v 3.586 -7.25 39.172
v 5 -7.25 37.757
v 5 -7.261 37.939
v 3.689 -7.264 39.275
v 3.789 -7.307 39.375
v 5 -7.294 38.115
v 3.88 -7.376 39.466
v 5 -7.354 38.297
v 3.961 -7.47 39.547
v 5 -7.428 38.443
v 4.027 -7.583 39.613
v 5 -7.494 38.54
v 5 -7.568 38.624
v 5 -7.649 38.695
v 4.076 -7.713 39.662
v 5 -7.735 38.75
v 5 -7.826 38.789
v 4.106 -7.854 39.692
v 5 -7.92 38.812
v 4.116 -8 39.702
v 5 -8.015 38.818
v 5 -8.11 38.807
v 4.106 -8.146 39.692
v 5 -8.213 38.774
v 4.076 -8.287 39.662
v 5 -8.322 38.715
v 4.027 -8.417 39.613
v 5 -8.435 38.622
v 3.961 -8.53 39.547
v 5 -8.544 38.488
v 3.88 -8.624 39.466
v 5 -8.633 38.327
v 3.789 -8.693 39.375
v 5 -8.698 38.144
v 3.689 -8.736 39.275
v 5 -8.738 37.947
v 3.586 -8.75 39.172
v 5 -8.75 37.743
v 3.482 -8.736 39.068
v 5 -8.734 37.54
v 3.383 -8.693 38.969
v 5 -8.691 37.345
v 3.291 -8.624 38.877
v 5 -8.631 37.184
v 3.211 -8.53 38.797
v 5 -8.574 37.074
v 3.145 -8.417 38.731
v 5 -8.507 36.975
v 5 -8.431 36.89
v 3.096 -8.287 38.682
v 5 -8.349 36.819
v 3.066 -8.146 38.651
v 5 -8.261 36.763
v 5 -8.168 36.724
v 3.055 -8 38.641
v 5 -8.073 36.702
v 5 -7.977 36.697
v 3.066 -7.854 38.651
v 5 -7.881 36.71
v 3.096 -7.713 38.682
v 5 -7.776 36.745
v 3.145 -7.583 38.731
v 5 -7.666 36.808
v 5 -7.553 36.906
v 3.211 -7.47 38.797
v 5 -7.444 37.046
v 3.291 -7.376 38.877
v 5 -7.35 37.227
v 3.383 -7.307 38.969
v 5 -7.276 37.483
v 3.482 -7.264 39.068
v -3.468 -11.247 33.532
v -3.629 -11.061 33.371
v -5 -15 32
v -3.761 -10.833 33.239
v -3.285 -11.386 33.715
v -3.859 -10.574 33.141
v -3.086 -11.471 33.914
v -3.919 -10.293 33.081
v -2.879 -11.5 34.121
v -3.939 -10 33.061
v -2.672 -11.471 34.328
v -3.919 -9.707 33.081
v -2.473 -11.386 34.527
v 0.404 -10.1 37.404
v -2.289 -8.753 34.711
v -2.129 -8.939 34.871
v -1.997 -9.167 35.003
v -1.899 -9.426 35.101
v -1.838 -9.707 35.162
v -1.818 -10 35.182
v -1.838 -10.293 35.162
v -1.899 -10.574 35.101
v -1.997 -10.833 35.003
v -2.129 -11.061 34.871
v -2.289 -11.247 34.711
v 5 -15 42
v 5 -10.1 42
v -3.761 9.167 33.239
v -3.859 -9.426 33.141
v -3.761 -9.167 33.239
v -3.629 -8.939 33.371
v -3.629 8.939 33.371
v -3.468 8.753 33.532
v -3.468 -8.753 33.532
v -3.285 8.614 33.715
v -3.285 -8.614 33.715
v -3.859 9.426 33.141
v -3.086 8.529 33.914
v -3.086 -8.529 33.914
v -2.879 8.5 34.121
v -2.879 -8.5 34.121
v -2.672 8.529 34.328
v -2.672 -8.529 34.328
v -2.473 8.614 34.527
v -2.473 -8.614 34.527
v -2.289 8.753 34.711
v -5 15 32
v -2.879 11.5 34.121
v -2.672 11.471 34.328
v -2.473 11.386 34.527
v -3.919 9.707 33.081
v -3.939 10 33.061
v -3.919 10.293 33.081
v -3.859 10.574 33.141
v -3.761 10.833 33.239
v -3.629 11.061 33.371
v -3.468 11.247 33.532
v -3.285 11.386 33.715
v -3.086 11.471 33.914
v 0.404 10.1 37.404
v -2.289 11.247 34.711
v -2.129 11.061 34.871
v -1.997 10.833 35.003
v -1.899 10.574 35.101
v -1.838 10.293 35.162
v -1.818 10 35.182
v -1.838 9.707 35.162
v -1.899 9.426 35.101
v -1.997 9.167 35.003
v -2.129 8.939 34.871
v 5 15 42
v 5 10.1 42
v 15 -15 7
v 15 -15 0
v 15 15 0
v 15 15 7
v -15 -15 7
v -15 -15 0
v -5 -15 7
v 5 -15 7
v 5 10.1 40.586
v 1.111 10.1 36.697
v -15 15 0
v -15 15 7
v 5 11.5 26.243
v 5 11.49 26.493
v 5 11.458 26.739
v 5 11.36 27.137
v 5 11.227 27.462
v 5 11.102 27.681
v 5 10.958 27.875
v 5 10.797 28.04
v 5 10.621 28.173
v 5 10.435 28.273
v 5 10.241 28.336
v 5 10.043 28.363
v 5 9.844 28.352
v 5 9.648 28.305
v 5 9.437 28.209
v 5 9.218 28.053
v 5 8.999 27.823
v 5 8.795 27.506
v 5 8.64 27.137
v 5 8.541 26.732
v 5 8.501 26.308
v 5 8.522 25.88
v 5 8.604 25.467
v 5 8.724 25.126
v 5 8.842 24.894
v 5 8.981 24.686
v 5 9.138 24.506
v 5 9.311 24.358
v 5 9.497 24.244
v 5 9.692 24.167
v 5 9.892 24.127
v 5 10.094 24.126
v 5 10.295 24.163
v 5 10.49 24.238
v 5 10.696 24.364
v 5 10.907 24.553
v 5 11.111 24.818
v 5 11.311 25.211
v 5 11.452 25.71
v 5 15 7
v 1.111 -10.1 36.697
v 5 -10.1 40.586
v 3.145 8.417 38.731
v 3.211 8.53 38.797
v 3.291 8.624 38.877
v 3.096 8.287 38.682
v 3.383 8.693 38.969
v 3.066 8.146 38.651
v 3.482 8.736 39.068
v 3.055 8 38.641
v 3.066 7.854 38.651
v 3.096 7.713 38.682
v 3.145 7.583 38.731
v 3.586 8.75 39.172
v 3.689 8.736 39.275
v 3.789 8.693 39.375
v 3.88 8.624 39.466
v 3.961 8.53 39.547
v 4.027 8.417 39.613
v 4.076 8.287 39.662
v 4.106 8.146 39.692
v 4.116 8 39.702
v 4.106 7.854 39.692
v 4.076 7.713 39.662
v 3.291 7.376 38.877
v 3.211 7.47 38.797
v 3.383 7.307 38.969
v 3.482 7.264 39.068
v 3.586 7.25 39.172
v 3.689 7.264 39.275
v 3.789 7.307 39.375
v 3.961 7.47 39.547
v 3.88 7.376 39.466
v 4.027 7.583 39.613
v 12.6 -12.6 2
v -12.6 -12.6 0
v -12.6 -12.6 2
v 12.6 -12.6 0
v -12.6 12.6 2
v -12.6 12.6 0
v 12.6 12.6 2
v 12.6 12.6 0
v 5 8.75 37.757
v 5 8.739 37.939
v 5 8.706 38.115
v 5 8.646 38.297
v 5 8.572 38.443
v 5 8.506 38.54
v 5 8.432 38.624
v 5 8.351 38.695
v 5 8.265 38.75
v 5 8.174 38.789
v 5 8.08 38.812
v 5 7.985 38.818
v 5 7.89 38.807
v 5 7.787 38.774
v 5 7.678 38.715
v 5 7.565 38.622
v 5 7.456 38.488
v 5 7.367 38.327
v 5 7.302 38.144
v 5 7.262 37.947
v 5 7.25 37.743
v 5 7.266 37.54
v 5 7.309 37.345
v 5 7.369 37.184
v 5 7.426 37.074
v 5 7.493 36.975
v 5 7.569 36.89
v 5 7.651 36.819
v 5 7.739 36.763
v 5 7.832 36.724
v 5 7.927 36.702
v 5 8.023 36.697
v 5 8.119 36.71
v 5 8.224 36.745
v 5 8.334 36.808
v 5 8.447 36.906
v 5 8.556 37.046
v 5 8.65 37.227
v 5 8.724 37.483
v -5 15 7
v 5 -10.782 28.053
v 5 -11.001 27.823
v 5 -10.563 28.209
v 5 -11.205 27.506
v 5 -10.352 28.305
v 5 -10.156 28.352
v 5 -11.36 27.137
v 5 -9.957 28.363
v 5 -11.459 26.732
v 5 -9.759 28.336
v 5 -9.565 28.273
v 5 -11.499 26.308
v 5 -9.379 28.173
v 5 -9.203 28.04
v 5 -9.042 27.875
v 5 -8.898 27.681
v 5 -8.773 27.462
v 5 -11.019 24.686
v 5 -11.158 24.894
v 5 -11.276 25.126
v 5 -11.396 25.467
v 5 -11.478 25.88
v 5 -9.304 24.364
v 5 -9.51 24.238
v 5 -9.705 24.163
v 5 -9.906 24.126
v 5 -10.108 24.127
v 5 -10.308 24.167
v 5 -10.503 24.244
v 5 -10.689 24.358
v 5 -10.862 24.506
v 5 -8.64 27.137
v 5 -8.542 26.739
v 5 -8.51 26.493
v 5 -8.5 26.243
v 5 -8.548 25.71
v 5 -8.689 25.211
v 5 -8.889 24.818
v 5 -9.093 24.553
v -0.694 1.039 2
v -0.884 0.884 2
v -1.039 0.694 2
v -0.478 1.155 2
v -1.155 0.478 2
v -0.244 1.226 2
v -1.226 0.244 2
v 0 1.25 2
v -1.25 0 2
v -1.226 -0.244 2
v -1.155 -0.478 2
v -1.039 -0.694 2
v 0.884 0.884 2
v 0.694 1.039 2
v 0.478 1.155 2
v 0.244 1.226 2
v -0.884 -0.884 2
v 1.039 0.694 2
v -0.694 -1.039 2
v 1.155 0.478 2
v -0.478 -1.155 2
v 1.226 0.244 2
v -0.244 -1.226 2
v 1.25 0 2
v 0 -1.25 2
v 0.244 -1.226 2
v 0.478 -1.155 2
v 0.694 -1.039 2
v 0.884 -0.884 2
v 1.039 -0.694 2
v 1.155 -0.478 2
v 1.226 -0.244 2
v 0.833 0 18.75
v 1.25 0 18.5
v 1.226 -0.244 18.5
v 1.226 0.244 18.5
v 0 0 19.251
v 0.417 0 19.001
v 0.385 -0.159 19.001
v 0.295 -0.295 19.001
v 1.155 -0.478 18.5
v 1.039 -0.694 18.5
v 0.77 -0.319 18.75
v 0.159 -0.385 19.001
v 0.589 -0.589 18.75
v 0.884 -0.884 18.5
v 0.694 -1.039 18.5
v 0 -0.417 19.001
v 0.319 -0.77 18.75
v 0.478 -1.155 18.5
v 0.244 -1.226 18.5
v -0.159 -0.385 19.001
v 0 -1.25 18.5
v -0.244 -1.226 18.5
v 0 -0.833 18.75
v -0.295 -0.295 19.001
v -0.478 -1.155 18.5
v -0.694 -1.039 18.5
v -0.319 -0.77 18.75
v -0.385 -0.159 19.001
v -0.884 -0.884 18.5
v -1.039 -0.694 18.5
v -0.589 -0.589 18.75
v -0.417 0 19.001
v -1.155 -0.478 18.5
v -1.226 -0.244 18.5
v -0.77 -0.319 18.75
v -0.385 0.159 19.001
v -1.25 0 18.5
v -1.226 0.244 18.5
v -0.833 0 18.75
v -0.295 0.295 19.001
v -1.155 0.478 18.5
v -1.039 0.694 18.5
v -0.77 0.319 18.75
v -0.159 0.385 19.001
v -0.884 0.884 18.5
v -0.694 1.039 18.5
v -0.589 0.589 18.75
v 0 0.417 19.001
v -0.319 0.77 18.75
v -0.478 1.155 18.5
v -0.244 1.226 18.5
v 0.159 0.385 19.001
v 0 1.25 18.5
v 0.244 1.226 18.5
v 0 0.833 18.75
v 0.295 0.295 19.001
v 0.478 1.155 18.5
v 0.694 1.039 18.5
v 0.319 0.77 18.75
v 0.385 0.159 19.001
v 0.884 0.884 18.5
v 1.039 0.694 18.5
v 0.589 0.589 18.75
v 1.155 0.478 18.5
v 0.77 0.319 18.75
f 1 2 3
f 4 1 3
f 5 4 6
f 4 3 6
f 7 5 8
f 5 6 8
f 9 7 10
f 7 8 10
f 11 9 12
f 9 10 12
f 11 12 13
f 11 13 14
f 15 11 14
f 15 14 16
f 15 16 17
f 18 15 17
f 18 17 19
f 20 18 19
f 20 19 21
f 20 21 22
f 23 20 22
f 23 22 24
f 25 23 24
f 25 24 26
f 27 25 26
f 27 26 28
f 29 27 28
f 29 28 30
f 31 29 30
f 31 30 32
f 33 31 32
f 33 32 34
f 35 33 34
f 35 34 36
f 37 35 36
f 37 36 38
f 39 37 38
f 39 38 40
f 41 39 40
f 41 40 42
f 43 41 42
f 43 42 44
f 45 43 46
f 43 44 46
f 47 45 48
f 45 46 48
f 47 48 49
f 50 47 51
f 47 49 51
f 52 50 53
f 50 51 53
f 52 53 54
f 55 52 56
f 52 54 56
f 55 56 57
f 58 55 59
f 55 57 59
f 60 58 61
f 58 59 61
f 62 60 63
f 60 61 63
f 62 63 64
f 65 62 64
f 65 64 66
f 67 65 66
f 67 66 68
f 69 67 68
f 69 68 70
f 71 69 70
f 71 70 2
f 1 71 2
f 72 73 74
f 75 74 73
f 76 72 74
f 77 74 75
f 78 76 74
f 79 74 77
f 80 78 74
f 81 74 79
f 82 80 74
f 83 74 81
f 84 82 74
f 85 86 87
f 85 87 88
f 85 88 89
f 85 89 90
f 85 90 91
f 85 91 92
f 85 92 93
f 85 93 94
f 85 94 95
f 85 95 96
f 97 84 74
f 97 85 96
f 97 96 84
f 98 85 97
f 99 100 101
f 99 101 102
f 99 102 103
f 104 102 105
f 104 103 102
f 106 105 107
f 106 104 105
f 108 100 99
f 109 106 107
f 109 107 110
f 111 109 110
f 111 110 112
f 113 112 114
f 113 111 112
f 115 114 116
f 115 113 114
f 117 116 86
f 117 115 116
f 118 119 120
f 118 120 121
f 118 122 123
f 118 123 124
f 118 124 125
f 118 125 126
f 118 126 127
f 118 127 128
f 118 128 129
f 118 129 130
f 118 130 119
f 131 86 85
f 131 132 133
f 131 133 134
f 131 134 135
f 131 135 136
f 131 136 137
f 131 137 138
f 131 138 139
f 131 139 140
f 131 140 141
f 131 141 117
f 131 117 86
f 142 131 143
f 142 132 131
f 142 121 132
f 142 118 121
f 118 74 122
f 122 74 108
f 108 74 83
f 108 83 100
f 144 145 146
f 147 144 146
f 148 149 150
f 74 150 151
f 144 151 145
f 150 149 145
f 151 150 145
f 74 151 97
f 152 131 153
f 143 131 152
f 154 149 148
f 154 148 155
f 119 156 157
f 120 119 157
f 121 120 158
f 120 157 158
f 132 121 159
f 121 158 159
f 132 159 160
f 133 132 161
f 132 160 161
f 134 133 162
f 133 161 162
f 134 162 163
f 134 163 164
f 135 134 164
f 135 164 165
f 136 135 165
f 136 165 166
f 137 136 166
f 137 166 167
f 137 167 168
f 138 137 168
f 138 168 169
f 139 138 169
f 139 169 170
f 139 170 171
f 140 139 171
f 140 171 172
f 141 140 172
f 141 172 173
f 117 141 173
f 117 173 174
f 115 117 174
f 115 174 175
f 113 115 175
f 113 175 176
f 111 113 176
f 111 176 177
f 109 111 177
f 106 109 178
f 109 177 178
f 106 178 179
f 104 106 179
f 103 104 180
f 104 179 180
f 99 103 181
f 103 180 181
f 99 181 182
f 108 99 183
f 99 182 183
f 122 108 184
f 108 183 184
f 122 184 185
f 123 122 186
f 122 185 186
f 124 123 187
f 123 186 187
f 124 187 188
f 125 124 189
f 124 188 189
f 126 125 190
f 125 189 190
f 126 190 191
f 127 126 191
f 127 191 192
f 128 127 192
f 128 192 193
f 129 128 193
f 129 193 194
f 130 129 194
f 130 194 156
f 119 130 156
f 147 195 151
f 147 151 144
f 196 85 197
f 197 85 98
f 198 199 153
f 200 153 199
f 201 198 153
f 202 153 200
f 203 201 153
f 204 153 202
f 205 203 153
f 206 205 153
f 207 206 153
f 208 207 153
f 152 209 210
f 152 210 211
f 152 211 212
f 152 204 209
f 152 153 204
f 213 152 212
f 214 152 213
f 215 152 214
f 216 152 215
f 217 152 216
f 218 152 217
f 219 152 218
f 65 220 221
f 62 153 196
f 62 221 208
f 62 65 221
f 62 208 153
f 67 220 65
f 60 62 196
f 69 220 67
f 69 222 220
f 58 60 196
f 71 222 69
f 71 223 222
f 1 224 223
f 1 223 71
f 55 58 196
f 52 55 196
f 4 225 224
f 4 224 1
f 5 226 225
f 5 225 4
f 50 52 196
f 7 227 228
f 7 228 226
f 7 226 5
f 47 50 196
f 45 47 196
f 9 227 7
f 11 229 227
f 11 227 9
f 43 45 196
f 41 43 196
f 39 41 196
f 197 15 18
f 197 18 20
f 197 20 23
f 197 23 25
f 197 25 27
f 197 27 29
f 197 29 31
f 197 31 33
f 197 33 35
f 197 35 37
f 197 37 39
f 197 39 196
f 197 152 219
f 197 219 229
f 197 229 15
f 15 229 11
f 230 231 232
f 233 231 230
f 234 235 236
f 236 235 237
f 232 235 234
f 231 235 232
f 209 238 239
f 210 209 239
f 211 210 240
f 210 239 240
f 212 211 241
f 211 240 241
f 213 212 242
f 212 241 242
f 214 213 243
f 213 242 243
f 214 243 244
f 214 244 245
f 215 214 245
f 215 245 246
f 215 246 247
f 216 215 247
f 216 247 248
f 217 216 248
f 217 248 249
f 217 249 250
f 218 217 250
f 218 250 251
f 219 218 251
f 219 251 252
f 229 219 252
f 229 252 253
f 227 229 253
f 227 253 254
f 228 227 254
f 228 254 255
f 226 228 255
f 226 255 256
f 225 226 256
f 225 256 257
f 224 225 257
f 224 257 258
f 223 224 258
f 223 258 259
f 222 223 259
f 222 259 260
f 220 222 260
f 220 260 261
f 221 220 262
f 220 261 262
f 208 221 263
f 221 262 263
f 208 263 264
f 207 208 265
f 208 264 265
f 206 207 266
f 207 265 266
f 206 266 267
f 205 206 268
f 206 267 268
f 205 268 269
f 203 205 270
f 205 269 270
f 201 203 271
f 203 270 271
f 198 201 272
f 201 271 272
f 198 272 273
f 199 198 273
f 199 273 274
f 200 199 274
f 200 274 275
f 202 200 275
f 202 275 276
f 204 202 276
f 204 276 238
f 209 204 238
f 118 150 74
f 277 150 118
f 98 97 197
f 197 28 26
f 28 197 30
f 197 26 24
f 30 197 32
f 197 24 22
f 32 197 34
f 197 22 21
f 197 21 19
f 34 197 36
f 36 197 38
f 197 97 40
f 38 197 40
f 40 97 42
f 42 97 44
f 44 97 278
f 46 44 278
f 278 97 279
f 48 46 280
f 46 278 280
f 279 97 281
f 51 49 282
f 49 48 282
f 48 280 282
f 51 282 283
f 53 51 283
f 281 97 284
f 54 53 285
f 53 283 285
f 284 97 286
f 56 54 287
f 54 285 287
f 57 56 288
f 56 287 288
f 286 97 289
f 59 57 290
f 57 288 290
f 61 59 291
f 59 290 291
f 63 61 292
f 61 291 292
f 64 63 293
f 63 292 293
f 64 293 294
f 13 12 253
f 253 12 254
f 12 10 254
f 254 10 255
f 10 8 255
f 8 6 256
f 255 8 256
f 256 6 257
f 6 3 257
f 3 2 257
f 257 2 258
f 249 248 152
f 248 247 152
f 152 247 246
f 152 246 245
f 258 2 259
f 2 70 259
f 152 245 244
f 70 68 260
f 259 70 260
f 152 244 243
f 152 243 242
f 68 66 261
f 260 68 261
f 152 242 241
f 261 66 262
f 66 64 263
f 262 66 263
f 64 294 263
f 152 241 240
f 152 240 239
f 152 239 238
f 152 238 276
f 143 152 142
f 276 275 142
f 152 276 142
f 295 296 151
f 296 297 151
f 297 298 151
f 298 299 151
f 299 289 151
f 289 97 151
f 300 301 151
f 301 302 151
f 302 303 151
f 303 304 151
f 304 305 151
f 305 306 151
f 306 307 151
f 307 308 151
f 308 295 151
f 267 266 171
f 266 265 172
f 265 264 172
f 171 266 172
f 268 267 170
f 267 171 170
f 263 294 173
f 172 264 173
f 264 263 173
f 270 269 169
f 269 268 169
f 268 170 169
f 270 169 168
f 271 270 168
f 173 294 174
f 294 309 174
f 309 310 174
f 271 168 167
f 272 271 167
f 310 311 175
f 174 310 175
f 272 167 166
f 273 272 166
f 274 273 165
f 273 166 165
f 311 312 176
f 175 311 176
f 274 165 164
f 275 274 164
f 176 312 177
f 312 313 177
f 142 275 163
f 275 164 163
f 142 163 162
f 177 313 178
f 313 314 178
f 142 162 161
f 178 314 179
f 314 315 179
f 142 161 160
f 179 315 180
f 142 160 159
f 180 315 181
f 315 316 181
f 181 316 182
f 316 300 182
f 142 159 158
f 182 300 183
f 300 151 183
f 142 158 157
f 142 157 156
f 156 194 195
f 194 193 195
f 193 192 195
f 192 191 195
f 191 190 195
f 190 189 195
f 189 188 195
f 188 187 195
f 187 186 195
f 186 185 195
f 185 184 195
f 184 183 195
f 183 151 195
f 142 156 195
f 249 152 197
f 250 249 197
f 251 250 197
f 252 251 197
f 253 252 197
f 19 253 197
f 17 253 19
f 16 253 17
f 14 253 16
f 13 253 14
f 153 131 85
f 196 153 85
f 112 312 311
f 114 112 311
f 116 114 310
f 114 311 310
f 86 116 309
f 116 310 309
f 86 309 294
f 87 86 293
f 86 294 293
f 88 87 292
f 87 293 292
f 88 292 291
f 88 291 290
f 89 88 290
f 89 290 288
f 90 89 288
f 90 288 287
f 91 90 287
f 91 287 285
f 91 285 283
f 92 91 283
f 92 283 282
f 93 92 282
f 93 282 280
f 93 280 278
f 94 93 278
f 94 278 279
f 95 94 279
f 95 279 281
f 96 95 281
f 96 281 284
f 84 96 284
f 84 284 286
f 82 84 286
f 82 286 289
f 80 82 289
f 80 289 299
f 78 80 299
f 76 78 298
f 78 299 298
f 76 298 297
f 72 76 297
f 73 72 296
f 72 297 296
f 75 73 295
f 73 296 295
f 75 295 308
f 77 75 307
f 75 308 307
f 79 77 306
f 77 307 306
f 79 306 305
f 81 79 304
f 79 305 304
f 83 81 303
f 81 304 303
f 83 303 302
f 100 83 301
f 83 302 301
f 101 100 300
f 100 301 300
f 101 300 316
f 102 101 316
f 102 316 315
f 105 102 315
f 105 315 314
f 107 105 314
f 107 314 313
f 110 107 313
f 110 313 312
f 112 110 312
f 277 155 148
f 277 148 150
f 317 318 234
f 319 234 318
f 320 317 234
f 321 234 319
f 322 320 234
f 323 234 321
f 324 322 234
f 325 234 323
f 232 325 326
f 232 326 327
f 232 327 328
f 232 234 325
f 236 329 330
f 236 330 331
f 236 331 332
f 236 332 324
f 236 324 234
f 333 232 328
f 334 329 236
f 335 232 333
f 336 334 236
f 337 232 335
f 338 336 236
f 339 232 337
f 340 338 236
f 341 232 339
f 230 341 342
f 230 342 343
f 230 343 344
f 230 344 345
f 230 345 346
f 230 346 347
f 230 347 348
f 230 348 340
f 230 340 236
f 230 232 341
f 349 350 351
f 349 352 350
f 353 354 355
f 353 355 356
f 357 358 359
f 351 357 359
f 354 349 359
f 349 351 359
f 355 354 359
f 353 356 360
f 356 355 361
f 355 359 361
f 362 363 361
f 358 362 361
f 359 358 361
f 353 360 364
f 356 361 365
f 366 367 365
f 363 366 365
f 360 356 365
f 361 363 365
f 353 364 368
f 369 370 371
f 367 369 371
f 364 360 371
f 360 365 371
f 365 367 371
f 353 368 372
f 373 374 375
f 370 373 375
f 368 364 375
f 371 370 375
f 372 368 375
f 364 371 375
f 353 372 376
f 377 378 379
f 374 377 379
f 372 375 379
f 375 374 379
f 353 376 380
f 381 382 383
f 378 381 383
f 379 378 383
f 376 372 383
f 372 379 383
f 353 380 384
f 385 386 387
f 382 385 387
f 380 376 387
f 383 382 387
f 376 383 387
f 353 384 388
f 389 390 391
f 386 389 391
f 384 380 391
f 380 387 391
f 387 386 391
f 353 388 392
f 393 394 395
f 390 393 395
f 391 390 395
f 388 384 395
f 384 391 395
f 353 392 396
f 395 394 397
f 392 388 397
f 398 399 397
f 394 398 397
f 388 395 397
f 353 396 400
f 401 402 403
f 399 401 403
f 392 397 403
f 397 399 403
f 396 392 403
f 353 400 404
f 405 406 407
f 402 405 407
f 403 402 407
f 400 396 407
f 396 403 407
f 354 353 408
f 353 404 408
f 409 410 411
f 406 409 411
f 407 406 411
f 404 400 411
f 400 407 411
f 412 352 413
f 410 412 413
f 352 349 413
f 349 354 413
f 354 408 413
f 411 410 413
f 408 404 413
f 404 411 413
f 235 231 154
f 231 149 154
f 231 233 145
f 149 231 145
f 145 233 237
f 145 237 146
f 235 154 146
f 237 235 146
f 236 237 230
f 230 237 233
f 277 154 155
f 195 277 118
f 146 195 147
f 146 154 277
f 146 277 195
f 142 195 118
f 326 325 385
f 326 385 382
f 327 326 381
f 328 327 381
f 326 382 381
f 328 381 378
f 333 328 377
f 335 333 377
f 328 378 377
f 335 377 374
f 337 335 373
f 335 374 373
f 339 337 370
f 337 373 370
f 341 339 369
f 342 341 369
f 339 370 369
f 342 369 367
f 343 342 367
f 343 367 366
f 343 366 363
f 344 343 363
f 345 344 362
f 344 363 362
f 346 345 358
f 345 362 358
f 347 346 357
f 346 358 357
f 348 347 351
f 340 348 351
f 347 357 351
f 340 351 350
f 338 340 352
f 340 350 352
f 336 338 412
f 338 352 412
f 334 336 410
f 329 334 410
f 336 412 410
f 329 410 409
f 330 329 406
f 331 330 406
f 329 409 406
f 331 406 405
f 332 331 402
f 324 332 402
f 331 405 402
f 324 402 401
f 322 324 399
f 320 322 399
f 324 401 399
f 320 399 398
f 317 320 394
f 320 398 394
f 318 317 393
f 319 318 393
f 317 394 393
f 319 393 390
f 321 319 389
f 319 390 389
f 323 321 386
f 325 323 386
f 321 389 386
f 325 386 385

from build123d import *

# Parameters (mm, degrees)
F0_W        = 30
F0_H        = 30
F1_DEPTH    = 7
F2_W        = 10
F2_H        = 30
F3_DEPTH    = 35
F4_T1_DEPTH = 81.4336597593
F5_W        = 25.2
F5_H        = 25.2
F6_DEPTH    = 2
F9_D        = 2.5
F9_DEPTH    = 16.5
F9_TIP      = 0.7510757738
F10_W       = 20.2
F10_H       = 6.5
F11_DEPTH   = 1
F14_D       = 1.5
F16_D       = 3


# Not quite as in the source:
# - a fillet or chamfer that OpenCascade refuses, or shapes differently, is made with other operations: its cross-section is extruded or revolved along the edge and cut away or added


with BuildPart() as f1:
    # F0 (on Top) → F1 (new body)
    with BuildSketch(Plane.XY):
        Rectangle(F0_W, F0_H)
    extrude(amount=F1_DEPTH)

    # F2 (on face) → F3 (join)
    with BuildSketch(Plane.XY.offset(7)):
        Rectangle(F2_W, F2_H)
    extrude(amount=F3_DEPTH)

    # F4: chamfer of 10 on 1 edges, made by hand

    # F4_s2 → F4_t1 (cut)
    with BuildSketch(Plane.XZ.offset(-40.7168298797)):
        Polygon((-5, 32), (5, 42), (-5, 42), align=None)
    extrude(amount=F4_T1_DEPTH, mode=Mode.SUBTRACT)


with BuildPart() as f6:
    # F5 (on face) → F6 (new body)
    with BuildSketch(Plane(origin=(0, 0, 0), x_dir=(1, 0, 0), z_dir=(0, 0, -1))):
        Rectangle(F5_W, F5_H)
    extrude(amount=-F6_DEPTH)


with BuildPart() as f1_1:
    add(f1.part)

    # F7: cut F6
    add(f6.part, mode=Mode.SUBTRACT)

    # F9
    with Locations(Plane(origin=(0, 0, 2), x_dir=(1, 0, 0), z_dir=(0, 0, -1))):
        with Locations((0, 0)):
            Hole(F9_D / 2, depth=F9_DEPTH)
            with Locations((0, 0, -(F9_DEPTH + F9_TIP / 2))):  # 118° drill point
                Cone(0, F9_D / 2, F9_TIP, mode=Mode.SUBTRACT)


with BuildPart() as f11:
    # F10 (on face) → F11 (new body)
    with BuildSketch(Plane(origin=(-18.5, 0, 18.5), x_dir=(0, -1, 0), z_dir=(-0.7071067812, 0, 0.7071067812))):
        with Locations((0, 29.9840187158)):
            Rectangle(F10_W, F10_H)
    extrude(amount=-F11_DEPTH)


with BuildPart() as f1_2:
    add(f1_1.part)

    # F12: cut F11
    add(f11.part, mode=Mode.SUBTRACT)

    # F14 (through all)
    with Locations(Plane(origin=(-17.7928932188, 0, 17.7928932188), x_dir=(0, -1, 0), z_dir=(-0.7071067812, 0, 0.7071067812))):
        with Locations((-8, 30.2340187158), (8, 30.2340187158)):
            Hole(F14_D / 2)

    # F16 (through all)
    with Locations(Plane(origin=(-18.5, 0, 18.5), x_dir=(0, -1, 0), z_dir=(-0.7071067812, 0, 0.7071067812))):
        with Locations((-10, 22.091883092), (10, 22.091883092)):
            Hole(F16_D / 2)


solid = f1_2.part
